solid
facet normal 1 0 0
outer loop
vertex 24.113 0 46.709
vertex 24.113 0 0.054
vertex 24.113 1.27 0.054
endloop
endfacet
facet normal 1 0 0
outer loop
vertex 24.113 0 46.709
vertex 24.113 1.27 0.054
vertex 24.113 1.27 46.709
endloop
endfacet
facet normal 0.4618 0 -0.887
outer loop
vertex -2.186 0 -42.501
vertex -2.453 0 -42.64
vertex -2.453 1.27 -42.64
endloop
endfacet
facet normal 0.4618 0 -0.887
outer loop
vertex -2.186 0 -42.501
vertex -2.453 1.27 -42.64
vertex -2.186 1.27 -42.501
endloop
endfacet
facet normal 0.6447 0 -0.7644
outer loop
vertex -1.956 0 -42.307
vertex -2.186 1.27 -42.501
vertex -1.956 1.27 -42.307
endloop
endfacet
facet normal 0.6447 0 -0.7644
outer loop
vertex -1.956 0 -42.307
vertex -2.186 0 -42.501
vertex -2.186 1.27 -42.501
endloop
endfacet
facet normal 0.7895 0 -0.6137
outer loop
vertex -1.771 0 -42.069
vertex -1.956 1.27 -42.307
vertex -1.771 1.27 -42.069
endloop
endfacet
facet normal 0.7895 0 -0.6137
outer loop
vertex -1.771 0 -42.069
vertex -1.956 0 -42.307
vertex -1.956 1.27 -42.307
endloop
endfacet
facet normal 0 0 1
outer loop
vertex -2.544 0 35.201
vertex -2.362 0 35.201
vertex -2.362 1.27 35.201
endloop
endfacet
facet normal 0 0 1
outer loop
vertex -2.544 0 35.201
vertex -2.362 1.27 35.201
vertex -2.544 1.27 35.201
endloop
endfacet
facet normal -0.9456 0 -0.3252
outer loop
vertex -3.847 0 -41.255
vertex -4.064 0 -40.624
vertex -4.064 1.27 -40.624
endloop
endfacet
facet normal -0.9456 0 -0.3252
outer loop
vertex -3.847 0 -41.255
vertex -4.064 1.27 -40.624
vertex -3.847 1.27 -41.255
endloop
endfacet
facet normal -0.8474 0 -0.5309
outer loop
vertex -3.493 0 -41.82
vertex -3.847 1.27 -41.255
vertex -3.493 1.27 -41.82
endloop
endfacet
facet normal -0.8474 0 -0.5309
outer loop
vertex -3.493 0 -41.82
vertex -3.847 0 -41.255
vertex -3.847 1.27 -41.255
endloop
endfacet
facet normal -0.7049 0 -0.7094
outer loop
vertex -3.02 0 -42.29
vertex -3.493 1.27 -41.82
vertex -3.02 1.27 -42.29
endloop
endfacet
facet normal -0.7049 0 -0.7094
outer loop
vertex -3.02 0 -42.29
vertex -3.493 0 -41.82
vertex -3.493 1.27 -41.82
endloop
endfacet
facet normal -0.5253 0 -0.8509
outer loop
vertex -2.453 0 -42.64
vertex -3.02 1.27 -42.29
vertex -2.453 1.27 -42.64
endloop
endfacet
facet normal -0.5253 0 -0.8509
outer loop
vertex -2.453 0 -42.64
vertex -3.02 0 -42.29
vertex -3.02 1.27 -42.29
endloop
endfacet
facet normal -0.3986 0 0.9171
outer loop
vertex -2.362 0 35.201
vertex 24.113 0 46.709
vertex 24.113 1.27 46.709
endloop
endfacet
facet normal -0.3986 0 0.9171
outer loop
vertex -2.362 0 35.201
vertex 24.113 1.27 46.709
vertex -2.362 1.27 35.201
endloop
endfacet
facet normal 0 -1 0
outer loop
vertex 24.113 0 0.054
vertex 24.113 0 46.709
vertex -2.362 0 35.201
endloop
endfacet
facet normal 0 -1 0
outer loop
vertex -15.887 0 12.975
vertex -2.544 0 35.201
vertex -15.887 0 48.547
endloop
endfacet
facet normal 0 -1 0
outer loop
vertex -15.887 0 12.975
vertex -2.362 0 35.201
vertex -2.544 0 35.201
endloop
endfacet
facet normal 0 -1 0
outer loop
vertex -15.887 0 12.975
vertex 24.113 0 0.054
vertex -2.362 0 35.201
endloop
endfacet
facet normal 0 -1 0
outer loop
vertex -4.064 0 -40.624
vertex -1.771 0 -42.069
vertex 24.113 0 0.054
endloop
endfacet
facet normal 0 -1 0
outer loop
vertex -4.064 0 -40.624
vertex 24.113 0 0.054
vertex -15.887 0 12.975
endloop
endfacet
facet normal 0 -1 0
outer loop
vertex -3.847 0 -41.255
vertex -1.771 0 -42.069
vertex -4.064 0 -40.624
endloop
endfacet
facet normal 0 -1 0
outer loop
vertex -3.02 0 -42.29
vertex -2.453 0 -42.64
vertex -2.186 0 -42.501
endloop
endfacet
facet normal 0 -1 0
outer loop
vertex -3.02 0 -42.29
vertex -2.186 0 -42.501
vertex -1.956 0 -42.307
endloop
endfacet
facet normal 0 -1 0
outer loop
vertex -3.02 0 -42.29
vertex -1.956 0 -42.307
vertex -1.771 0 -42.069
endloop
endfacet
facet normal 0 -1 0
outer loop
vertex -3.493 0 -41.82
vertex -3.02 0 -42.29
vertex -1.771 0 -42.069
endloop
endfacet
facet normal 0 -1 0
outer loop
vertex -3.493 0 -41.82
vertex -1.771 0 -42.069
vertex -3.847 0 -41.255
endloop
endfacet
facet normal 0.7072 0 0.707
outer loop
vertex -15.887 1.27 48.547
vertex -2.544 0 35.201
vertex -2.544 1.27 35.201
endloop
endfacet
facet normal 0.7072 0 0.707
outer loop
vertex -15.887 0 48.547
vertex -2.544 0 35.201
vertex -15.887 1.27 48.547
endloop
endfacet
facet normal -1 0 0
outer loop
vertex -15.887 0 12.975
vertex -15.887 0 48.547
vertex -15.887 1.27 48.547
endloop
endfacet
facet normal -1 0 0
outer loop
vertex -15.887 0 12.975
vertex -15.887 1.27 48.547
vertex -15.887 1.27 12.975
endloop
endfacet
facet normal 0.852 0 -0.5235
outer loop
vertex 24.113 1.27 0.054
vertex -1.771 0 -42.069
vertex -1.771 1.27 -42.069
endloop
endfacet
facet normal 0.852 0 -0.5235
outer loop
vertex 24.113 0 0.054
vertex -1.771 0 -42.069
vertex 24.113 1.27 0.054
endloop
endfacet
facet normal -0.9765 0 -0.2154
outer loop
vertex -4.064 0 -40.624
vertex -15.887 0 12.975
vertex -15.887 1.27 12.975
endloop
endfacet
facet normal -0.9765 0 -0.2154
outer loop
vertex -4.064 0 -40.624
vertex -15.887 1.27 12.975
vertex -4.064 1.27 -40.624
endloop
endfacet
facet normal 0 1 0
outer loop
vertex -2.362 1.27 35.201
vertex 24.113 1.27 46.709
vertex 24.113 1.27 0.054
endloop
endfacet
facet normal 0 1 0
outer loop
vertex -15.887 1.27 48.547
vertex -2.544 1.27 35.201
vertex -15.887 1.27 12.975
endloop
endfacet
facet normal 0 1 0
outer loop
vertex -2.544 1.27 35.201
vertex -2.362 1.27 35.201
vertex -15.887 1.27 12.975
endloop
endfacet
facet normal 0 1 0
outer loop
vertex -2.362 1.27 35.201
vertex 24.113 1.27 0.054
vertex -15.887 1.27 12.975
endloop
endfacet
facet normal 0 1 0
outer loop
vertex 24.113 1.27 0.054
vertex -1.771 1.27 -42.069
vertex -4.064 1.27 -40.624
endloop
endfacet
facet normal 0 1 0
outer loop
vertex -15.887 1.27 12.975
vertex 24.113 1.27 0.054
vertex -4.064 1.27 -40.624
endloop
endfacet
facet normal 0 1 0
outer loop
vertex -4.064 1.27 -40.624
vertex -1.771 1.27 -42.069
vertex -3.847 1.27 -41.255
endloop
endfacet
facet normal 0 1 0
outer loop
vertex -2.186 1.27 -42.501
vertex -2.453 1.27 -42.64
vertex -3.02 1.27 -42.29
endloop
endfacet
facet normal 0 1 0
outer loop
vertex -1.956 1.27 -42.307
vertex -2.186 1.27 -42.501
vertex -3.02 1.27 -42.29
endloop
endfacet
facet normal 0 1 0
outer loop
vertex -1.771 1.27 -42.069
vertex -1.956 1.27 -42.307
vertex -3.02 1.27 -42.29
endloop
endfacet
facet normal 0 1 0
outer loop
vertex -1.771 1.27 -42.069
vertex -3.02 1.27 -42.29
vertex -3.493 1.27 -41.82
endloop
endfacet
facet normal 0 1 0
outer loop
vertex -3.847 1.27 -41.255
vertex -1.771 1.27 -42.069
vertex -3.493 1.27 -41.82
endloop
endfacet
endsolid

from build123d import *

# Parameters (mm, degrees)
BOSS_EXTRUDE1_DEPTH = 1.27


with BuildPart() as part:
    # Sketch2 → Boss-Extrude1 (new body)
    with BuildSketch(Plane(origin=(0, 0, 0), x_dir=(1, 0, 0), z_dir=(0, 1, 0))):
        with BuildLine():
            Line((-2.543725523, -35.200677289), (-15.887270656, -48.546652053))
            Line((-15.887270656, -48.546652053), (-15.887270656, -12.975156939))
            Line((-15.887270656, -12.975156939), (-4.064387109, 40.624362144))
            ThreePointArc((-4.064387109, 40.624362144), (-3.49318097, 41.819860184), (-2.452860743, 42.640363592))
            ThreePointArc((-2.452860743, 42.640363592), (-2.065756158, 42.410049072), (-1.771451049, 42.069051652))
            Line((-1.771451049, 42.069051652), (24.112729344, -0.05377363))
            Line((24.112729344, -0.05377363), (24.112729344, -46.70931259))
            Line((24.112729344, -46.70931259), (-2.361995962, -35.200677289))
            Line((-2.361995962, -35.200677289), (-2.543725523, -35.200677289))
        make_face()
    extrude(amount=BOSS_EXTRUDE1_DEPTH)


solid = part.part
